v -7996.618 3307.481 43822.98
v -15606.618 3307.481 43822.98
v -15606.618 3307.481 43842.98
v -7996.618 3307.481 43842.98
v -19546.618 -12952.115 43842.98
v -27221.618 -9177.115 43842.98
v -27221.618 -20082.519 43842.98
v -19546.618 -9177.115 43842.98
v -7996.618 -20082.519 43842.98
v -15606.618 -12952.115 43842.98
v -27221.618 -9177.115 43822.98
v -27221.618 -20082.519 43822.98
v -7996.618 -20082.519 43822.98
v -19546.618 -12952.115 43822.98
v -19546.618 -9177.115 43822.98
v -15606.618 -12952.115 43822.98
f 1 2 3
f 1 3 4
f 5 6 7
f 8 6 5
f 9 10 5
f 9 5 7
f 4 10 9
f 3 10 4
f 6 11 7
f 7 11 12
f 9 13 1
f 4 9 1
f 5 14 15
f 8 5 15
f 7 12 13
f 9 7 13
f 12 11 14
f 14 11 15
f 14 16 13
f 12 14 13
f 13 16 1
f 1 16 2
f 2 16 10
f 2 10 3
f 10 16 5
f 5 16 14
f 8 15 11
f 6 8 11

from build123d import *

# Parameters (mm, degrees)
SKETCH1_W           = 7610
SKETCH1_H           = 23390
BOSS_EXTRUDE1_DEPTH = 20


with BuildPart() as part:
    # Sketch1 → Boss-Extrude1 (new body)
    with BuildSketch(Plane.XY.offset(43822.979549141)):
        with Locations((-11801.617683291, -8387.518633414)):
            Rectangle(SKETCH1_W, SKETCH1_H)
        Polygon((-15606.617683291, -20082.518633414), (-15606.617683291, -12952.114633414), (-19546.617683291, -12952.114633414), (-27221.617683291, -12952.114633414), (-27221.617683291, -20082.518633414), align=None)
        Polygon((-27221.617683291, -12952.114633414), (-19546.617683291, -12952.114633414), (-19546.617683291, -12882.518633414), (-19546.617683291, -9177.114633414), (-27221.617683291, -9177.114633414), align=None)
    extrude(amount=BOSS_EXTRUDE1_DEPTH)


solid = part.part
